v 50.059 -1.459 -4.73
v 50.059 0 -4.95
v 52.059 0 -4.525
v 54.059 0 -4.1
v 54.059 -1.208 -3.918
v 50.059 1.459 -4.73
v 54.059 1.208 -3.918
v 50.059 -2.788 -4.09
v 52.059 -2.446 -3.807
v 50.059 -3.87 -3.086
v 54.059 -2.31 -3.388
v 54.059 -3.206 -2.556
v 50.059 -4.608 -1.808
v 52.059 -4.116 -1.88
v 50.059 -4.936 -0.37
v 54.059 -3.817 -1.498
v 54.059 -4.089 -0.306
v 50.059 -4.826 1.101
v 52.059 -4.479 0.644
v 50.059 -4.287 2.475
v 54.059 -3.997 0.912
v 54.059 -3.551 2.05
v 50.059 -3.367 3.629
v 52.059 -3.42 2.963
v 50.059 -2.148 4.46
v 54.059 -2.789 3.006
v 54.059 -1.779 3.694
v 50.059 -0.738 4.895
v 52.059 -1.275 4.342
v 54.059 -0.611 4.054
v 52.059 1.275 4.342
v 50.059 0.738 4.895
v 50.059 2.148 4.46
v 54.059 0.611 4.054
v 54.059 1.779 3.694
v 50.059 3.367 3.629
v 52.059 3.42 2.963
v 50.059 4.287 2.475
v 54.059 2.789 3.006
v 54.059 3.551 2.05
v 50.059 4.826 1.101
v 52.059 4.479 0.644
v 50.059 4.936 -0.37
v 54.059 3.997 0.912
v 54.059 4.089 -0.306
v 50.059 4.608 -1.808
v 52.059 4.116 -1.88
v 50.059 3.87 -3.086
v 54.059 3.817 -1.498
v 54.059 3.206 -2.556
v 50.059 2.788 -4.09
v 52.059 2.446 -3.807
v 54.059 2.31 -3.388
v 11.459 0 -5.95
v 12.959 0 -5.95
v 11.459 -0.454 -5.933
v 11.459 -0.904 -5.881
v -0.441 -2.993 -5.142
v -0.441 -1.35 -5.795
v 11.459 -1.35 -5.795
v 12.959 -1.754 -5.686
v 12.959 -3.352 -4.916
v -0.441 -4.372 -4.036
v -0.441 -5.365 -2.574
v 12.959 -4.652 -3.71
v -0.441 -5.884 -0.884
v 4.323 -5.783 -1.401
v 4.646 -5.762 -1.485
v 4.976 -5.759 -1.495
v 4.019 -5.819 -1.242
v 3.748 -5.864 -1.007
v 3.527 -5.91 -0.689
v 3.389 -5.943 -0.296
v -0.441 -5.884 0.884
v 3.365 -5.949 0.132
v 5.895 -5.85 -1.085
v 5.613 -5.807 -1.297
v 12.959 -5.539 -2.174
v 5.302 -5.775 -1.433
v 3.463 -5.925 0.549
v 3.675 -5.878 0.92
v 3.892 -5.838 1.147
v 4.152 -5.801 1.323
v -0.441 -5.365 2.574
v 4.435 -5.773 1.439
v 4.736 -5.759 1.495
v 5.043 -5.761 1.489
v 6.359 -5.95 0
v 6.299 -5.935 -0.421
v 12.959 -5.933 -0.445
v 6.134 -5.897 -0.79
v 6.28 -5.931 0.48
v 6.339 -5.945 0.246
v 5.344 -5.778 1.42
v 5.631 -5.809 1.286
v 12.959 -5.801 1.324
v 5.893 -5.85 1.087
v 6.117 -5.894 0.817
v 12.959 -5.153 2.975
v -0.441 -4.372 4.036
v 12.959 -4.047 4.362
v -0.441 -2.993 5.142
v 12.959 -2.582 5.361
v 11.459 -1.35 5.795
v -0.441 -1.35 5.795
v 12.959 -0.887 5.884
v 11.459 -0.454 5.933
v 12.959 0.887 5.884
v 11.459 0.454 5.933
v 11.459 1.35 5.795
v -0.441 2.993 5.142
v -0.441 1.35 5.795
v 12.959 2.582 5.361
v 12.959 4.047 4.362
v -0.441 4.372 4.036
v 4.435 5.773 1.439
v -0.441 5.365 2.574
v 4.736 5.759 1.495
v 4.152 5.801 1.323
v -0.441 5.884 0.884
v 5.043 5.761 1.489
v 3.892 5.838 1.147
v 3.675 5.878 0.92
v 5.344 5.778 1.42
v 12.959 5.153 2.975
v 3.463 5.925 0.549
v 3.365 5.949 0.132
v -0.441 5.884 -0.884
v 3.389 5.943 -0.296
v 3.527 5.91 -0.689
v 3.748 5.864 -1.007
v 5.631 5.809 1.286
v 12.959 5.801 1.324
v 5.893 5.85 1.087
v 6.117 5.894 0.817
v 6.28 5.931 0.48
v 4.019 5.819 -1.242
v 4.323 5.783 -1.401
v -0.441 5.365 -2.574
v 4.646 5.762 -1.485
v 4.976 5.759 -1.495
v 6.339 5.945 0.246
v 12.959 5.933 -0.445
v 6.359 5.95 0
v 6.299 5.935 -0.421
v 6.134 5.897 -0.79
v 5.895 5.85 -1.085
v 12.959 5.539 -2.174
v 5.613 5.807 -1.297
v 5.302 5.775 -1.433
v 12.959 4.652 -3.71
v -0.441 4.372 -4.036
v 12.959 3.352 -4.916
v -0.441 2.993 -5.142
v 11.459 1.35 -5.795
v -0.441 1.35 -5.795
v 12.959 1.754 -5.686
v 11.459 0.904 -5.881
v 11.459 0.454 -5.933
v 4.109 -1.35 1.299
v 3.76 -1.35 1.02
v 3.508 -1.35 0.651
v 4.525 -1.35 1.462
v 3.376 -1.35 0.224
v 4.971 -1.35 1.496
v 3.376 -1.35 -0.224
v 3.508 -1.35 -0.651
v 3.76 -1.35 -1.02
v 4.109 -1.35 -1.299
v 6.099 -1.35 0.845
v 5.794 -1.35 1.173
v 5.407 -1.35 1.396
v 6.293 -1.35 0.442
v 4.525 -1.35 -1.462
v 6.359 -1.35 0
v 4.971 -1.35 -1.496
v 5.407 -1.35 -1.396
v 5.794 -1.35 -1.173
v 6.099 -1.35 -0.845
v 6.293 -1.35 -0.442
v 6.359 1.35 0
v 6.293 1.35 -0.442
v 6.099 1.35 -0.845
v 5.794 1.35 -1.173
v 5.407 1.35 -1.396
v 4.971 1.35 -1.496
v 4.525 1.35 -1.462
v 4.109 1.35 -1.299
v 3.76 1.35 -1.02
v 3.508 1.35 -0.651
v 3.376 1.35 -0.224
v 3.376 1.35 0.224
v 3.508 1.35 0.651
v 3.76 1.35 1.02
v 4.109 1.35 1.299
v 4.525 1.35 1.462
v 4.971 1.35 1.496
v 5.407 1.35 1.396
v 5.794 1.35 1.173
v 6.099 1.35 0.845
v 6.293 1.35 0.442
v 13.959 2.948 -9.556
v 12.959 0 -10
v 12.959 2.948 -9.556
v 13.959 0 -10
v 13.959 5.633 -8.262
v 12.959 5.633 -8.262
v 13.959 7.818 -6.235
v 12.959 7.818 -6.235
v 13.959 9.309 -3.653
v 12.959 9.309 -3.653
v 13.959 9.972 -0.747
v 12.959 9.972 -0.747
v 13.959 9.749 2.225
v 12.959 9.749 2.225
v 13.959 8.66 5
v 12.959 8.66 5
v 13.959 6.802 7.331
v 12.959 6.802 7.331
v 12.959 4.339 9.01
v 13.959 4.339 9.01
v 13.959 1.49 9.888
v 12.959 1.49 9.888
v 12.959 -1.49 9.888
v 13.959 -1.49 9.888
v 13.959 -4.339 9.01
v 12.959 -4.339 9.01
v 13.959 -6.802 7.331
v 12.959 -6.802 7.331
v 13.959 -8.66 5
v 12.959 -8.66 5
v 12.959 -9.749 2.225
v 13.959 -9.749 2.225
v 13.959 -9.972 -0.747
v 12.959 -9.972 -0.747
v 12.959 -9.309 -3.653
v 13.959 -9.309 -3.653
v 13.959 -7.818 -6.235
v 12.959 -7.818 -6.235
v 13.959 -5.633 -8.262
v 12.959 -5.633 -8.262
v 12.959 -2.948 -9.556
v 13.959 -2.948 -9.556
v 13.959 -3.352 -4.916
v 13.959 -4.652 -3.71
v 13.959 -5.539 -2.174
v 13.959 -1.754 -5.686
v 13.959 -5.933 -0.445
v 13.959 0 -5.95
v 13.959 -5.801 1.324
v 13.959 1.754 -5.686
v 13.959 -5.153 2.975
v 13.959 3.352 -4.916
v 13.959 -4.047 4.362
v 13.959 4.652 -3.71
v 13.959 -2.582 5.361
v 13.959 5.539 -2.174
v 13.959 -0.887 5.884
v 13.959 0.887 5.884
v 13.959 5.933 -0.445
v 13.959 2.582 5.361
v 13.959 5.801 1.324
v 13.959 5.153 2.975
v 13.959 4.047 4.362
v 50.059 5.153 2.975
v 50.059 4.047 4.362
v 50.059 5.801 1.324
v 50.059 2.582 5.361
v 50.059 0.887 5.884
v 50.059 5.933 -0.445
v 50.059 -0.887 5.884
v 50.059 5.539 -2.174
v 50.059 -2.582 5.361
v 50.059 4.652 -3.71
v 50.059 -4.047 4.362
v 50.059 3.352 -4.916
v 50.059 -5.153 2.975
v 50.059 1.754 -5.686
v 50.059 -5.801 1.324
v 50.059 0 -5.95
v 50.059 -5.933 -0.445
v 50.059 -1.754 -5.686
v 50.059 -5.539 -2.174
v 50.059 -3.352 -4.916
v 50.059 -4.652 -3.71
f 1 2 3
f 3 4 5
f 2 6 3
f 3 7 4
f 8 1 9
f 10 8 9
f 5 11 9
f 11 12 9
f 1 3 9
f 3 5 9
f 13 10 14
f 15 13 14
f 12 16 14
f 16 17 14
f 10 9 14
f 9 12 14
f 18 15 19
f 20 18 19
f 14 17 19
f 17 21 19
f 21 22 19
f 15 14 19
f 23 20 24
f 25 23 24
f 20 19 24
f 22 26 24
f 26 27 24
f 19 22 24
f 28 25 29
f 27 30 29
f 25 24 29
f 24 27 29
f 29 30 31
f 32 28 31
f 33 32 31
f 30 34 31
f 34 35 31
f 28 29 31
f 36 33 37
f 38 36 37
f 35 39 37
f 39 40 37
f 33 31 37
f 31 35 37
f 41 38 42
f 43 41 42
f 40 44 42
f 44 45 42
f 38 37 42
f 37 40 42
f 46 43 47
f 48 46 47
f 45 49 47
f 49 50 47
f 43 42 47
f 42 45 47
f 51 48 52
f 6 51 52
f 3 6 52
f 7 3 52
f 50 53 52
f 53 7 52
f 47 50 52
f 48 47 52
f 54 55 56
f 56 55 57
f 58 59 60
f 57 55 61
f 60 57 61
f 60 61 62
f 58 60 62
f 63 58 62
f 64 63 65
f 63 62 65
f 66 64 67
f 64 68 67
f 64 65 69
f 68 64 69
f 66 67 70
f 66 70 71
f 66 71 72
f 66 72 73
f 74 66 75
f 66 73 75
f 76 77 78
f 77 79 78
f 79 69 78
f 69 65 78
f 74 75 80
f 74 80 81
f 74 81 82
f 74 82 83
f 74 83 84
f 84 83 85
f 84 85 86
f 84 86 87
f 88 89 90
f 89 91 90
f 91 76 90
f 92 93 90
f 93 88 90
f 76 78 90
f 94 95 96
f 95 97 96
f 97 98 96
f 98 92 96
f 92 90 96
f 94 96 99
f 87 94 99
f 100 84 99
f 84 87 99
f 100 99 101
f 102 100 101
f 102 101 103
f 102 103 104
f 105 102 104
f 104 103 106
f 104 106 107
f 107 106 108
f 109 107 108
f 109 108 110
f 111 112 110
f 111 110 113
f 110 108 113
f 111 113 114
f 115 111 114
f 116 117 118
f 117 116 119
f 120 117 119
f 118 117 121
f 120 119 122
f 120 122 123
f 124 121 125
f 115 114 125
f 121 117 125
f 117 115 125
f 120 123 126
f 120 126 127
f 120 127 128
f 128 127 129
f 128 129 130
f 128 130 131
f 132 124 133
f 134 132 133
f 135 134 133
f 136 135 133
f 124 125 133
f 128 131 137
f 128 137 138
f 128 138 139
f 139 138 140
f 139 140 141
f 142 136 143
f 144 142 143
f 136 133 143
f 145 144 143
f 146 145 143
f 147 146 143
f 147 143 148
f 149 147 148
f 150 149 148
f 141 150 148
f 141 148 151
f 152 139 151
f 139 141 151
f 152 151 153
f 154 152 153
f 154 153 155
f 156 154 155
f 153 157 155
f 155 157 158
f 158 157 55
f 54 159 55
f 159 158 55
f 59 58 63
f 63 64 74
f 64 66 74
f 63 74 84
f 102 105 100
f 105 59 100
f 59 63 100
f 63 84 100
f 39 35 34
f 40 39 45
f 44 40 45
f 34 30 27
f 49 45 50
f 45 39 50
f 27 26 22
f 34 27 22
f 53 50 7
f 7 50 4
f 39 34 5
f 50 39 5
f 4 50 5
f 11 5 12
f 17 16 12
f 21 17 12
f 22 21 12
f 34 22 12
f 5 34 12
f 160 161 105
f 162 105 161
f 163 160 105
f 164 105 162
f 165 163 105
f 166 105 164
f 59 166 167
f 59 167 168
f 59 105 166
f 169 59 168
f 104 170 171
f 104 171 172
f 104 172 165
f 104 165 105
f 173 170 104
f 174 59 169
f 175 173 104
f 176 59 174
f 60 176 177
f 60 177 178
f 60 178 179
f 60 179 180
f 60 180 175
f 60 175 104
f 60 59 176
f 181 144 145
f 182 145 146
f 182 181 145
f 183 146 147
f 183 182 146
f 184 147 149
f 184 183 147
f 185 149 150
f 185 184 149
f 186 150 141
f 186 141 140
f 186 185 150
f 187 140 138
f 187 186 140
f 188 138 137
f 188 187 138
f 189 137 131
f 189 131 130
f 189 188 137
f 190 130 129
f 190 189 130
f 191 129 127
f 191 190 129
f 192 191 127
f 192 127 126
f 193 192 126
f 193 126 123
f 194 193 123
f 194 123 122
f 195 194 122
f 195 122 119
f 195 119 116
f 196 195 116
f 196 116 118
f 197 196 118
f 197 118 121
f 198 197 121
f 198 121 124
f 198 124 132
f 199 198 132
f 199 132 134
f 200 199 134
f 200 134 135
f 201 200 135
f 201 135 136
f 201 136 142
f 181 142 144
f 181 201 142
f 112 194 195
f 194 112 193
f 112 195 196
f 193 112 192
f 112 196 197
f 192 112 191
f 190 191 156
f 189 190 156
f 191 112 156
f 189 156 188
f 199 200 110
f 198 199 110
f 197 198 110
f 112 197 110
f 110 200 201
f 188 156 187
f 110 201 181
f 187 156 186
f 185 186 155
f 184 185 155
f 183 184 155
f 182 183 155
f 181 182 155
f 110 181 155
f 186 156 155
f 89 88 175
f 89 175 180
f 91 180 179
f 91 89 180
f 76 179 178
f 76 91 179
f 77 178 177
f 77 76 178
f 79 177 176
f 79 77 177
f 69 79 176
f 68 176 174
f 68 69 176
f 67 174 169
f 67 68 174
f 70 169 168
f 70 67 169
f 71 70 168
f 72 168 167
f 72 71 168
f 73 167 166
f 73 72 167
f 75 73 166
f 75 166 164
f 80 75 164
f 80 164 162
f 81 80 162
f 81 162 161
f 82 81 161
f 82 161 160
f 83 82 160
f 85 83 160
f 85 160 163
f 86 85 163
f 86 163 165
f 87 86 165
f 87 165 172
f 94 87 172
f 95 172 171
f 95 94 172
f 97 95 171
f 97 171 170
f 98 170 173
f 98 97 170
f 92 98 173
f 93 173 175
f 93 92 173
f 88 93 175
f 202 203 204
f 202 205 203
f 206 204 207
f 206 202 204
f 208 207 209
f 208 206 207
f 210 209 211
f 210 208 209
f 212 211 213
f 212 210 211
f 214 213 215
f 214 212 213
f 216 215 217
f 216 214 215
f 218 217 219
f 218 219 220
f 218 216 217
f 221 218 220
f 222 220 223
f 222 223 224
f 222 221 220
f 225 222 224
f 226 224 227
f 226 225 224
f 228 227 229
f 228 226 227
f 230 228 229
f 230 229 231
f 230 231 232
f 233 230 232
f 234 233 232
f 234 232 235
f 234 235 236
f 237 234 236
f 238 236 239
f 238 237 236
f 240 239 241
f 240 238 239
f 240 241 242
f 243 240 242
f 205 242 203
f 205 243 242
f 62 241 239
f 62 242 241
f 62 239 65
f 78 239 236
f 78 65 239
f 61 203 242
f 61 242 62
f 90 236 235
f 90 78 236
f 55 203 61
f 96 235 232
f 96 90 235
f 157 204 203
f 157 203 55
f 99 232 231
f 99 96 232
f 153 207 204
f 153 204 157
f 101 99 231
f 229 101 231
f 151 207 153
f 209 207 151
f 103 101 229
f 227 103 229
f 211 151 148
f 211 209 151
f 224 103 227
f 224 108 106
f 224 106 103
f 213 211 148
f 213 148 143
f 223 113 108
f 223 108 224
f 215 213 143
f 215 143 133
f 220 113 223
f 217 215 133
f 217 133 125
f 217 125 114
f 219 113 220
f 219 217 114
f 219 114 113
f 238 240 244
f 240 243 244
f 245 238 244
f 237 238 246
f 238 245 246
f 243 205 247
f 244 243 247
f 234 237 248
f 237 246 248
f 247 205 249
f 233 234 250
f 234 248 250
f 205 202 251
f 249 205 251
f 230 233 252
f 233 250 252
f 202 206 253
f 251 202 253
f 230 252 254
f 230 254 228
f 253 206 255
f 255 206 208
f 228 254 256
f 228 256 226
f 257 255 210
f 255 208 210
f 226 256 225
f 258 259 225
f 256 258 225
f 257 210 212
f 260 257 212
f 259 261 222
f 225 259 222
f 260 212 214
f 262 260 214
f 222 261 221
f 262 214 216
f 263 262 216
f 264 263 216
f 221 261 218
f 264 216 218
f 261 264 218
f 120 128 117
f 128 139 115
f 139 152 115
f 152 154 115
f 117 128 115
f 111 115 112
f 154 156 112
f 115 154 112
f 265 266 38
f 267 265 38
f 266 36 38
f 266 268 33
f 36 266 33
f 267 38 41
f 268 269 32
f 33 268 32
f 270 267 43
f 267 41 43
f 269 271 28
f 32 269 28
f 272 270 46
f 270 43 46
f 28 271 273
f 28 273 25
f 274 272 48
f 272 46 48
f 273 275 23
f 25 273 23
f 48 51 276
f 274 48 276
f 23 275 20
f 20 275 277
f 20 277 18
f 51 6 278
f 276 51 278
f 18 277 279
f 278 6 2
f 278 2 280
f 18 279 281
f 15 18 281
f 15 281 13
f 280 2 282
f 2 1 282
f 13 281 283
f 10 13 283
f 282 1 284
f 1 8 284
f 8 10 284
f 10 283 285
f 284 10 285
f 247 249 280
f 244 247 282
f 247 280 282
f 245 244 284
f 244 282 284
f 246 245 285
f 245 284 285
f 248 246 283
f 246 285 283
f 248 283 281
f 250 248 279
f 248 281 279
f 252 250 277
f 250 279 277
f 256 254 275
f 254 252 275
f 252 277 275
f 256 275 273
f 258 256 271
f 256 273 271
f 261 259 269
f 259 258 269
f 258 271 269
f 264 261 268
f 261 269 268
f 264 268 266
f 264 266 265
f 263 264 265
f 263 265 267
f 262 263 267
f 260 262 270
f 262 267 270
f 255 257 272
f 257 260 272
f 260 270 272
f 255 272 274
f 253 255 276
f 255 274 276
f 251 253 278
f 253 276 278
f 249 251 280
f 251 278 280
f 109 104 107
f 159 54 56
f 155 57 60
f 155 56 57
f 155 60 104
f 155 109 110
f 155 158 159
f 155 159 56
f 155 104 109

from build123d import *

# Parameters (mm, degrees)
CORTAR_EXTRUIR1_DEPTH      = 10
CORTAR_EXTRUIR1_DEPTH_BACK = 10
CROQUIS2_W                 = 11.9
CROQUIS2_H                 = 2.7
CORTAR_EXTRUIR2_DEPTH      = 10
CORTAR_EXTRUIR2_DEPTH_BACK = 10
CROQUIS3_R                 = 1.5
CROQUIS4_W                 = 1
CROQUIS4_H                 = 10


with BuildPart() as part:
    # Croquis1 → Revolución1 (revolve)
    with BuildSketch(Plane.XY):
        Polygon((-0.440734801, 5.95), (50.059265199, 5.95), (50.059265199, 4.95), (54.059265199, 4.1), (54.059265199, 0), (0, 0), (-0.440734801, 0), align=None)
    revolve(axis=Axis((54.059265199, 0, 0), (-1, 0, 0)))

    # Croquis2 → Cortar-Extruir1 (cut, two sides: drawn at the far end of the back side and taken through both)
    with BuildSketch(Plane.XY.offset(-CORTAR_EXTRUIR1_DEPTH_BACK)):
        with Locations((5.509265199, 0)):
            Rectangle(CROQUIS2_W, CROQUIS2_H)
    extrude(amount=CORTAR_EXTRUIR1_DEPTH + CORTAR_EXTRUIR1_DEPTH_BACK, mode=Mode.SUBTRACT)

    # Croquis3 → Cortar-Extruir2 (cut, two sides: drawn at the far end of the back side and taken through both)
    with BuildSketch(Plane(origin=(0, 0, 0), x_dir=(1, 0, 0), z_dir=(0, 1, 0)).offset(-CORTAR_EXTRUIR2_DEPTH_BACK)):
        with Locations((4.859265199, 0)):
            Circle(CROQUIS3_R)
    extrude(amount=CORTAR_EXTRUIR2_DEPTH + CORTAR_EXTRUIR2_DEPTH_BACK, mode=Mode.SUBTRACT)

    # Croquis4 → Revolución2 (revolve)
    with BuildSketch(Plane(origin=(0, 0, 0), x_dir=(1, 0, 0), z_dir=(0, 1, 0))):
        with Locations((13.459265199, 5)):
            Rectangle(CROQUIS4_W, CROQUIS4_H)
    revolve(axis=Axis((0, 0, 0), (1, 0, 0)))


solid = part.part
